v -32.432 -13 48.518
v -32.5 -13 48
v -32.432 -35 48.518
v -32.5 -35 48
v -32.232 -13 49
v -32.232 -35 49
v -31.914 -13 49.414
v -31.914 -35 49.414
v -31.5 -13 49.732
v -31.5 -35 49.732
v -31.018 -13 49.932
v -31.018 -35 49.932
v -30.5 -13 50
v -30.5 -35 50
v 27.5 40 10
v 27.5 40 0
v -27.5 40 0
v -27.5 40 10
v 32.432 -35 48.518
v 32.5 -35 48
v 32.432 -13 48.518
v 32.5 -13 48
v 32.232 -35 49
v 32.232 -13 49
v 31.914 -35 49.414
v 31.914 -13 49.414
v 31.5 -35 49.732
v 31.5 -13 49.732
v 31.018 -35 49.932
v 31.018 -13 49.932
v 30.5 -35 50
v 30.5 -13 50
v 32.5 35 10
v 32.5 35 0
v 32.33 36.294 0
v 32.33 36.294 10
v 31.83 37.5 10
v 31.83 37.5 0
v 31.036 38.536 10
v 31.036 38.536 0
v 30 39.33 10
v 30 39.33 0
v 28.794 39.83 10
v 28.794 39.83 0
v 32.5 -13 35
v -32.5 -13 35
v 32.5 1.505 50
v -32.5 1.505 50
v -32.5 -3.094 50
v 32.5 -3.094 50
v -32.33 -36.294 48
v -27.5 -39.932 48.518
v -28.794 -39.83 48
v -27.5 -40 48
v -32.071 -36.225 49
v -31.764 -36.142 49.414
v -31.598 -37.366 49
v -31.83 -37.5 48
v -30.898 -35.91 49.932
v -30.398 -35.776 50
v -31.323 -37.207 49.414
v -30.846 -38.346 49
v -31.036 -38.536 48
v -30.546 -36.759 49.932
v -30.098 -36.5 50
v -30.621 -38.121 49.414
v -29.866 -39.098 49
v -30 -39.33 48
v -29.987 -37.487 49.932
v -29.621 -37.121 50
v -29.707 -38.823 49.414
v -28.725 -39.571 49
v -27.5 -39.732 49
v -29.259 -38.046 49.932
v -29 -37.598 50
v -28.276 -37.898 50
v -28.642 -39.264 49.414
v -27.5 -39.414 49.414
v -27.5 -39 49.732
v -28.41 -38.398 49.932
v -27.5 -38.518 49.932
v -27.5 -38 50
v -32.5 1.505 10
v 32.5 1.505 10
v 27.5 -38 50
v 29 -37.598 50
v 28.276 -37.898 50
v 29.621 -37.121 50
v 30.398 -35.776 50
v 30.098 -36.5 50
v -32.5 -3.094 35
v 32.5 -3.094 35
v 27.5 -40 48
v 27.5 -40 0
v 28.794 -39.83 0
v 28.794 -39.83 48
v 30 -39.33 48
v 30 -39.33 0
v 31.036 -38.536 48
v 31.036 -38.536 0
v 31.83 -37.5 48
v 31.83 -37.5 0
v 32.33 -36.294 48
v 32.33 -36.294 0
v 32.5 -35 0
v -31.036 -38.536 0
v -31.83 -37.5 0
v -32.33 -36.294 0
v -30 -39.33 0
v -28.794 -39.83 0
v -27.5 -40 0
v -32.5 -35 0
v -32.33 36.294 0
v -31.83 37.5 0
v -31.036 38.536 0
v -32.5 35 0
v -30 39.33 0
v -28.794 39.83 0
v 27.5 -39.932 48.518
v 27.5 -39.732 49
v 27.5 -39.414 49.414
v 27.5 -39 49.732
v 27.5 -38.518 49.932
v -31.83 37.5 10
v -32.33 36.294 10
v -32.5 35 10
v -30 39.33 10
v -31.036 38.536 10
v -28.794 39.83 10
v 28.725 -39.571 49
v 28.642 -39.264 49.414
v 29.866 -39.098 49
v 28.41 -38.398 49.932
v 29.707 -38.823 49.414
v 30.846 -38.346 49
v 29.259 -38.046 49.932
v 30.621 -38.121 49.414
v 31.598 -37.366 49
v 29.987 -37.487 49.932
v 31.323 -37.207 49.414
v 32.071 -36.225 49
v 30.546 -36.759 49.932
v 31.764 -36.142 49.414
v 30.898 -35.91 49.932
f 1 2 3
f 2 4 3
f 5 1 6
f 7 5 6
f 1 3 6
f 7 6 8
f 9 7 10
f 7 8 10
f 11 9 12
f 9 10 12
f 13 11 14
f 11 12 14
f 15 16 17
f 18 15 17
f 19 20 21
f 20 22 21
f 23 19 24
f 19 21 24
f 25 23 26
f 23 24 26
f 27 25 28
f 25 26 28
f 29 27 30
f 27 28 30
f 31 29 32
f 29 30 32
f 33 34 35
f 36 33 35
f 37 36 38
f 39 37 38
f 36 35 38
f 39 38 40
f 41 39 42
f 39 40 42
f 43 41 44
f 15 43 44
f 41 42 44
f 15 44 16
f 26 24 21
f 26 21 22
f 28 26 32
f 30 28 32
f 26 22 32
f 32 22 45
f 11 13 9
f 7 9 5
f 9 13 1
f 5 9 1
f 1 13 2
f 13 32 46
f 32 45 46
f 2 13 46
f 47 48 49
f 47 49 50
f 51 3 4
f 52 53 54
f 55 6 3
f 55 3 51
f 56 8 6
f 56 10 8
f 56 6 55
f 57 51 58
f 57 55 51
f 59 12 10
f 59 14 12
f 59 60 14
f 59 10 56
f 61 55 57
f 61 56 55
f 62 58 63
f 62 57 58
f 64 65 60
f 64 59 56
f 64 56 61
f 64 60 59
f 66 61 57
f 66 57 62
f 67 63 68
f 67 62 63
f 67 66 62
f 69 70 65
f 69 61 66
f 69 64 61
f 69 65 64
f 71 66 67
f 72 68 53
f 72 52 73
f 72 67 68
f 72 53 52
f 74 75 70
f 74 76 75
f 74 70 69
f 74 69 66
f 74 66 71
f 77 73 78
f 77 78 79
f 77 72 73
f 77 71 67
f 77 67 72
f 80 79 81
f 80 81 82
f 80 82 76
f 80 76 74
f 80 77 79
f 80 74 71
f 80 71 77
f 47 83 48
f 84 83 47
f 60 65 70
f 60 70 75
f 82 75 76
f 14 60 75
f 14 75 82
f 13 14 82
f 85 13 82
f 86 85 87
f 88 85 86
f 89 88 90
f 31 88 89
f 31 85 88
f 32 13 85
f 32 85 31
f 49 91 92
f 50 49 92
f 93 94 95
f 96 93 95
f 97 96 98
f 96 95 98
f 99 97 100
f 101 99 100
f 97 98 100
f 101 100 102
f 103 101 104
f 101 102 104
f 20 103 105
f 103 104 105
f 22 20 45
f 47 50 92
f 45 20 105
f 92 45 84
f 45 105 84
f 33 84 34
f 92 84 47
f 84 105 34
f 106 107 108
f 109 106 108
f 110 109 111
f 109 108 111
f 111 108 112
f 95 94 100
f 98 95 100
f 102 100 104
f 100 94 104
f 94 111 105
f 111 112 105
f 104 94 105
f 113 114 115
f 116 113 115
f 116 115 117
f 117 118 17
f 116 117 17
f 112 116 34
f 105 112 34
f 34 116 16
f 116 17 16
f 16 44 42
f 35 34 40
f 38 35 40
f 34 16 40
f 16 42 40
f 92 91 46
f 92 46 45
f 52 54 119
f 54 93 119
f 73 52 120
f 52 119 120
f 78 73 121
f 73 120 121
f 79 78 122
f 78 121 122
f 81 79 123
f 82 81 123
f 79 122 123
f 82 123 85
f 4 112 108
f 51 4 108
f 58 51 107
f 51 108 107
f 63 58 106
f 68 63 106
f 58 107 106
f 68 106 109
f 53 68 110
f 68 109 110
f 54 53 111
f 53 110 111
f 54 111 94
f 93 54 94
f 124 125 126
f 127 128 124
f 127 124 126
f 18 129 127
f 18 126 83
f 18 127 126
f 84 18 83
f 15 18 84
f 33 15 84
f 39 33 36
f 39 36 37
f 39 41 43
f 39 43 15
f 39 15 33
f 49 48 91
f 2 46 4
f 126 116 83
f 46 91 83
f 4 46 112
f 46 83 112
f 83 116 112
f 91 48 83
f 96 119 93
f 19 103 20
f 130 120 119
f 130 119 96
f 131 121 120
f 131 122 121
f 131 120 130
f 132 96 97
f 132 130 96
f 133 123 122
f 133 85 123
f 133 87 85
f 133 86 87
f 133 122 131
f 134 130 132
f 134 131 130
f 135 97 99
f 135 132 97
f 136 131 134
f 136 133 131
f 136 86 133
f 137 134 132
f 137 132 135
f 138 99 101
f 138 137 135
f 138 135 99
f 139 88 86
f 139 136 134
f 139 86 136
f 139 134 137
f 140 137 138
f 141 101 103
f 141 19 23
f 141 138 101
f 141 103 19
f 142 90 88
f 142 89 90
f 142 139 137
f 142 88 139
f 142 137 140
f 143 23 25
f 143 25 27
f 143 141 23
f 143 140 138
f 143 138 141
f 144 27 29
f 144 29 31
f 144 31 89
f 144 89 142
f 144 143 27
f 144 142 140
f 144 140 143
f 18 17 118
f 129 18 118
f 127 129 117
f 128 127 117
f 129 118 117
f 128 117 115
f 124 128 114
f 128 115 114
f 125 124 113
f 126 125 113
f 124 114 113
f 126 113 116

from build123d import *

# Parameters (mm, degrees)
F0_W     = 65
F0_H     = 4.5996872587
F0_H_2   = 9.9056614563
F1_DEPTH = 10
F2_DEPTH = 50
F3_DEPTH = 35
F4_R     = 2


with BuildPart() as f1:
    # F0 (on Top) → F1 (new body)
    with BuildSketch(Plane.XY):
        with BuildLine():
            ThreePointArc((32.5, 35), (31.0355339059, 38.5355339059), (27.5, 40))
            Line((27.5, 40), (-27.5, 40))
            ThreePointArc((-27.5, 40), (-31.0355339059, 38.5355339059), (-32.5, 35))
            Line((-32.5, 35), (-32.5, 1.505348715))
            Line((-32.5, 1.505348715), (32.5, 1.505348715))
            Line((32.5, 1.505348715), (32.5, 35))
        make_face()
        with Locations((0, -0.7944949144)):
            Rectangle(F0_W, F0_H)
        with Locations((0, -8.0471692719)):
            Rectangle(F0_W, F0_H_2)
        with BuildLine():
            Line((32.5, -35), (32.5, -13))
            Line((32.5, -13), (-32.5, -13))
            Line((-32.5, -13), (-32.5, -35))
            ThreePointArc((-32.5, -35), (-31.0355339059, -38.5355339059), (-27.5, -40))
            Line((-27.5, -40), (27.5, -40))
            ThreePointArc((27.5, -40), (31.0355339059, -38.5355339059), (32.5, -35))
        make_face()
    extrude(amount=F1_DEPTH)

    # F0 (on Top) → F2 (join)
    with BuildSketch(Plane.XY):
        with Locations((0, -0.7944949144)):
            Rectangle(F0_W, F0_H)
        with BuildLine():
            Line((32.5, -35), (32.5, -13))
            Line((32.5, -13), (-32.5, -13))
            Line((-32.5, -13), (-32.5, -35))
            ThreePointArc((-32.5, -35), (-31.0355339059, -38.5355339059), (-27.5, -40))
            Line((-27.5, -40), (27.5, -40))
            ThreePointArc((27.5, -40), (31.0355339059, -38.5355339059), (32.5, -35))
        make_face()
    extrude(amount=F2_DEPTH)

    # F0 (on Top) → F3 (join)
    with BuildSketch(Plane.XY):
        with Locations((0, -8.0471692719)):
            Rectangle(F0_W, F0_H_2)
    extrude(amount=F3_DEPTH)

    # F4
    f4_edges = [f1.edges().sort_by_distance(p)[0] for p in [
        (-32.5, -24, 50),
        (32.5, -24, 50),
    ]]
    fillet(f4_edges, radius=F4_R)


solid = f1.part
